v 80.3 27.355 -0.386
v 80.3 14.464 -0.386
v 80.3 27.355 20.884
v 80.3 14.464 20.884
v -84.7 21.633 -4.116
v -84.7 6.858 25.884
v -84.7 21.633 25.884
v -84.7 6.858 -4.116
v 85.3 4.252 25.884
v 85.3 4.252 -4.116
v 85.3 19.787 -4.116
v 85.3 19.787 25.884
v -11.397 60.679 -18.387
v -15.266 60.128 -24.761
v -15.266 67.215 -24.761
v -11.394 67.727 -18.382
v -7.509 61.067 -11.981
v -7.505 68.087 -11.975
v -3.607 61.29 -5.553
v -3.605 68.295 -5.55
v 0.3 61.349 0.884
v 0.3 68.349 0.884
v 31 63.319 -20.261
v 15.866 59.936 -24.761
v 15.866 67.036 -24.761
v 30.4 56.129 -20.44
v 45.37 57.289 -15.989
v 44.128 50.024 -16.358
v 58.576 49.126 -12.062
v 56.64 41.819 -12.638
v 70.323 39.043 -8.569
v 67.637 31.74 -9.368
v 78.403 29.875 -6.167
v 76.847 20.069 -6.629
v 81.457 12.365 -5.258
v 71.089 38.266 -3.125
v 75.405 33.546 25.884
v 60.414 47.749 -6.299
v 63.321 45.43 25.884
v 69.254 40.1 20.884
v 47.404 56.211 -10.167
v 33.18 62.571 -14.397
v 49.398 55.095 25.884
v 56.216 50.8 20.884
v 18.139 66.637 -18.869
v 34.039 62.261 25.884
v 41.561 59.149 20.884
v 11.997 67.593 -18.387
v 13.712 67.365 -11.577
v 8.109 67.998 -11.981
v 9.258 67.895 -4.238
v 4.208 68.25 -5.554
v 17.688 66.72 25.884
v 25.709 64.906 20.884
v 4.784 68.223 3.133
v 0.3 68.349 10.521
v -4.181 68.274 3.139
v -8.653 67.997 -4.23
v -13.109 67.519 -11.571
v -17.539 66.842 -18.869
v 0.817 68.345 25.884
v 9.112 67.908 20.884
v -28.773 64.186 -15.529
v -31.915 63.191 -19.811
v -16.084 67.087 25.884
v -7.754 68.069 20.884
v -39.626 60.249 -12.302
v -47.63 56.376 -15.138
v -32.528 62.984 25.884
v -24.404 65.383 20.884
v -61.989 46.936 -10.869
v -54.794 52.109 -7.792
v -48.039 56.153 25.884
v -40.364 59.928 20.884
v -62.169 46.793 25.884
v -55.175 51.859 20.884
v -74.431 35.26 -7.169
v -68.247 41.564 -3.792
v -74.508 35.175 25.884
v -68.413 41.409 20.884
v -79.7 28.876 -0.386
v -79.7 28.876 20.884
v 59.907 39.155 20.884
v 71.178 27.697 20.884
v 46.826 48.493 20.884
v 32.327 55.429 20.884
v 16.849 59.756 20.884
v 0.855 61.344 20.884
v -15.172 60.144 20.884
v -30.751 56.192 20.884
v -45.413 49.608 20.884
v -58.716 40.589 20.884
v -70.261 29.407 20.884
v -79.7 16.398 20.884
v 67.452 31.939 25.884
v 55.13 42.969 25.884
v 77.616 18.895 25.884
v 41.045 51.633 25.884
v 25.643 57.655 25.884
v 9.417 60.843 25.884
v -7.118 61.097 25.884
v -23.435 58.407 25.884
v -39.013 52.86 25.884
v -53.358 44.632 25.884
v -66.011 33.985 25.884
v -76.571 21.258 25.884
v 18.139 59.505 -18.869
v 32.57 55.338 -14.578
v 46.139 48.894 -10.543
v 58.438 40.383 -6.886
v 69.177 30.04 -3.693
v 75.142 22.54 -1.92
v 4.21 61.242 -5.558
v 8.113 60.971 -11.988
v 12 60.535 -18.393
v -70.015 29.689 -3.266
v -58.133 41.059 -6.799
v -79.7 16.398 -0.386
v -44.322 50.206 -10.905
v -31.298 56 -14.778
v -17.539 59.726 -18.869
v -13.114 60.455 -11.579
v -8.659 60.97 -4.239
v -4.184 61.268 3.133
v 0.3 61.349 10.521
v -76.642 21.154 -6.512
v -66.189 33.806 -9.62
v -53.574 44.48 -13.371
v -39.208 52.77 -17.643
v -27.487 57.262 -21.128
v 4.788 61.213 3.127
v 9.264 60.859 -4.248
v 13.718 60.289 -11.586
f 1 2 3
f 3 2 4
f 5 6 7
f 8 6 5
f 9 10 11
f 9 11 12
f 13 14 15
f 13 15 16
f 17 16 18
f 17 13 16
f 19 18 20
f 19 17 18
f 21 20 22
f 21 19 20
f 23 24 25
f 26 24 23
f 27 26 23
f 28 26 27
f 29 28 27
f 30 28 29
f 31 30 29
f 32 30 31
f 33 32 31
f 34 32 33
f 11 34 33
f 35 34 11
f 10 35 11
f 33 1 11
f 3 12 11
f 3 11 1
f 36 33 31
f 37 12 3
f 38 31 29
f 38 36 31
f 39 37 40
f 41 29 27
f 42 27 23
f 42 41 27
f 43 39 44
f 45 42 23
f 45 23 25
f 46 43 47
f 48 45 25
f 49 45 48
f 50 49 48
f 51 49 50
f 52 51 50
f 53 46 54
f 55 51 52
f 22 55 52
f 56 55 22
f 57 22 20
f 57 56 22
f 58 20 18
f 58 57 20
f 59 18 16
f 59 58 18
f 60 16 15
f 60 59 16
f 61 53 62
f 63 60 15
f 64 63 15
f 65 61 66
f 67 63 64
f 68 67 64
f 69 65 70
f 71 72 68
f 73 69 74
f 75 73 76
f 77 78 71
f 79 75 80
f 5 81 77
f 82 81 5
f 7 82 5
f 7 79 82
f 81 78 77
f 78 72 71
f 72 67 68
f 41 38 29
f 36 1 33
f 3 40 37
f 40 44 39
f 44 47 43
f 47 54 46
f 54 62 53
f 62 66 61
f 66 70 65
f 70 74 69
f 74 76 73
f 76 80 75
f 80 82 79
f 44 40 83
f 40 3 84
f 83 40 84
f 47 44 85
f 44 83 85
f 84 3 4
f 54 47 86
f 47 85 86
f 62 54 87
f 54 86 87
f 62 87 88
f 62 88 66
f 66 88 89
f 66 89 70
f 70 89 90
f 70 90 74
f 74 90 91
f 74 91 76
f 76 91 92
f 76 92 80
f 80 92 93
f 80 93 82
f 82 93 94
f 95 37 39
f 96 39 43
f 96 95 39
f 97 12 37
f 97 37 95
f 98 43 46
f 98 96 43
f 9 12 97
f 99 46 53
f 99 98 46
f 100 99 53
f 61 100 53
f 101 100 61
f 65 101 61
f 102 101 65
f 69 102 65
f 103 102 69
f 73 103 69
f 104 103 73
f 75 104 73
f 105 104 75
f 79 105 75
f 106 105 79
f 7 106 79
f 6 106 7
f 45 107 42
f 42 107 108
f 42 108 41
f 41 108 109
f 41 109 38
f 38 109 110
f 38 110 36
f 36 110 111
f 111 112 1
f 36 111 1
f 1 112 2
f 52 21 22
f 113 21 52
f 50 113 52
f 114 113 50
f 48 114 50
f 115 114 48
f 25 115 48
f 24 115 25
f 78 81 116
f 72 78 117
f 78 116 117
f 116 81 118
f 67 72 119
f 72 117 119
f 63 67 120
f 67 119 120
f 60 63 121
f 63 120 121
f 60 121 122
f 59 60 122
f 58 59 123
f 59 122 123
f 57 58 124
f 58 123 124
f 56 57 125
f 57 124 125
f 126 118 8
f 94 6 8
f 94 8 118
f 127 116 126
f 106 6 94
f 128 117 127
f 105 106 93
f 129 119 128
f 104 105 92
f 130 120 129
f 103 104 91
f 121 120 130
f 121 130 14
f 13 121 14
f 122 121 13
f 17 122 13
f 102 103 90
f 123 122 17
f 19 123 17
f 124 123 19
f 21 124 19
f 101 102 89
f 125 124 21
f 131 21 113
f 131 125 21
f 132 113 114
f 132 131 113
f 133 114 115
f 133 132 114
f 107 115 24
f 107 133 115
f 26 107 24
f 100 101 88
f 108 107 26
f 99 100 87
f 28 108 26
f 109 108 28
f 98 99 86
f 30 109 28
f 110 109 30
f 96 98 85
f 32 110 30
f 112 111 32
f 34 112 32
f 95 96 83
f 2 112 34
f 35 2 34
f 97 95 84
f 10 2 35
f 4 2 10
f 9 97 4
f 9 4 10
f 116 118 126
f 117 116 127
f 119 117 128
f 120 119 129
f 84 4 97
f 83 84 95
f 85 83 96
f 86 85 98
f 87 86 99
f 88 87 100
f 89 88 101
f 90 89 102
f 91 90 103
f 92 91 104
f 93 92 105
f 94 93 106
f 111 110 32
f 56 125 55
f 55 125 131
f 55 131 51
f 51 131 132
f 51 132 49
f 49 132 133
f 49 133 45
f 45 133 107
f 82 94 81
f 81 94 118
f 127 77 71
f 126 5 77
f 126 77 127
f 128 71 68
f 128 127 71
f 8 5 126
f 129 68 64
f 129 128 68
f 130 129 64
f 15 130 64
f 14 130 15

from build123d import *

# Parameters (mm, degrees)
F1_DEPTH = 75
F3_DEPTH = 200
F5_DEPTH = 100


with BuildPart() as f1:
    # F0 (on Front) → F1 (new body, symmetric)
    with BuildSketch(Plane.XZ):
        Polygon((85.300012, 25.884279), (0.300012, 25.884279), (-84.699988, 25.884279), (-84.699988, -4.115721), (-15.266005, -24.761366), (0.300012, 0.884279), (15.866029, -24.761366), (85.300012, -4.115721), align=None)
    extrude(amount=F1_DEPTH, both=True)

    # F2 (on face) → F3 (cut)
    with BuildSketch(Plane.XZ.offset(75)):
        Polygon((-17.53865, -18.869264), (0.300012, 10.520655), (18.138673, -18.869264), (80.300012, -0.386082), (80.300012, 20.884279), (-79.699988, 20.884279), (-79.699988, -0.386082), align=None)
    extrude(amount=-F3_DEPTH, mode=Mode.SUBTRACT)

    # F4 (on face) → F5 (intersect)
    with BuildSketch(Plane.XY.offset(25.884279)):
        with BuildLine():
            Line((92.307648, -27.267169), (99.30098, -26.961725))
            ThreePointArc((99.30098, -26.961725), (-3.949265, 68.282407), (-99.880233, -34.330005))
            Line((-99.880233, -34.330005), (-92.883447, -34.117915))
            ThreePointArc((-92.883447, -34.117915), (-3.690492, 61.287192), (92.307648, -27.267169))
        make_face()
    extrude(amount=-F5_DEPTH, mode=Mode.INTERSECT)


solid = f1.part
